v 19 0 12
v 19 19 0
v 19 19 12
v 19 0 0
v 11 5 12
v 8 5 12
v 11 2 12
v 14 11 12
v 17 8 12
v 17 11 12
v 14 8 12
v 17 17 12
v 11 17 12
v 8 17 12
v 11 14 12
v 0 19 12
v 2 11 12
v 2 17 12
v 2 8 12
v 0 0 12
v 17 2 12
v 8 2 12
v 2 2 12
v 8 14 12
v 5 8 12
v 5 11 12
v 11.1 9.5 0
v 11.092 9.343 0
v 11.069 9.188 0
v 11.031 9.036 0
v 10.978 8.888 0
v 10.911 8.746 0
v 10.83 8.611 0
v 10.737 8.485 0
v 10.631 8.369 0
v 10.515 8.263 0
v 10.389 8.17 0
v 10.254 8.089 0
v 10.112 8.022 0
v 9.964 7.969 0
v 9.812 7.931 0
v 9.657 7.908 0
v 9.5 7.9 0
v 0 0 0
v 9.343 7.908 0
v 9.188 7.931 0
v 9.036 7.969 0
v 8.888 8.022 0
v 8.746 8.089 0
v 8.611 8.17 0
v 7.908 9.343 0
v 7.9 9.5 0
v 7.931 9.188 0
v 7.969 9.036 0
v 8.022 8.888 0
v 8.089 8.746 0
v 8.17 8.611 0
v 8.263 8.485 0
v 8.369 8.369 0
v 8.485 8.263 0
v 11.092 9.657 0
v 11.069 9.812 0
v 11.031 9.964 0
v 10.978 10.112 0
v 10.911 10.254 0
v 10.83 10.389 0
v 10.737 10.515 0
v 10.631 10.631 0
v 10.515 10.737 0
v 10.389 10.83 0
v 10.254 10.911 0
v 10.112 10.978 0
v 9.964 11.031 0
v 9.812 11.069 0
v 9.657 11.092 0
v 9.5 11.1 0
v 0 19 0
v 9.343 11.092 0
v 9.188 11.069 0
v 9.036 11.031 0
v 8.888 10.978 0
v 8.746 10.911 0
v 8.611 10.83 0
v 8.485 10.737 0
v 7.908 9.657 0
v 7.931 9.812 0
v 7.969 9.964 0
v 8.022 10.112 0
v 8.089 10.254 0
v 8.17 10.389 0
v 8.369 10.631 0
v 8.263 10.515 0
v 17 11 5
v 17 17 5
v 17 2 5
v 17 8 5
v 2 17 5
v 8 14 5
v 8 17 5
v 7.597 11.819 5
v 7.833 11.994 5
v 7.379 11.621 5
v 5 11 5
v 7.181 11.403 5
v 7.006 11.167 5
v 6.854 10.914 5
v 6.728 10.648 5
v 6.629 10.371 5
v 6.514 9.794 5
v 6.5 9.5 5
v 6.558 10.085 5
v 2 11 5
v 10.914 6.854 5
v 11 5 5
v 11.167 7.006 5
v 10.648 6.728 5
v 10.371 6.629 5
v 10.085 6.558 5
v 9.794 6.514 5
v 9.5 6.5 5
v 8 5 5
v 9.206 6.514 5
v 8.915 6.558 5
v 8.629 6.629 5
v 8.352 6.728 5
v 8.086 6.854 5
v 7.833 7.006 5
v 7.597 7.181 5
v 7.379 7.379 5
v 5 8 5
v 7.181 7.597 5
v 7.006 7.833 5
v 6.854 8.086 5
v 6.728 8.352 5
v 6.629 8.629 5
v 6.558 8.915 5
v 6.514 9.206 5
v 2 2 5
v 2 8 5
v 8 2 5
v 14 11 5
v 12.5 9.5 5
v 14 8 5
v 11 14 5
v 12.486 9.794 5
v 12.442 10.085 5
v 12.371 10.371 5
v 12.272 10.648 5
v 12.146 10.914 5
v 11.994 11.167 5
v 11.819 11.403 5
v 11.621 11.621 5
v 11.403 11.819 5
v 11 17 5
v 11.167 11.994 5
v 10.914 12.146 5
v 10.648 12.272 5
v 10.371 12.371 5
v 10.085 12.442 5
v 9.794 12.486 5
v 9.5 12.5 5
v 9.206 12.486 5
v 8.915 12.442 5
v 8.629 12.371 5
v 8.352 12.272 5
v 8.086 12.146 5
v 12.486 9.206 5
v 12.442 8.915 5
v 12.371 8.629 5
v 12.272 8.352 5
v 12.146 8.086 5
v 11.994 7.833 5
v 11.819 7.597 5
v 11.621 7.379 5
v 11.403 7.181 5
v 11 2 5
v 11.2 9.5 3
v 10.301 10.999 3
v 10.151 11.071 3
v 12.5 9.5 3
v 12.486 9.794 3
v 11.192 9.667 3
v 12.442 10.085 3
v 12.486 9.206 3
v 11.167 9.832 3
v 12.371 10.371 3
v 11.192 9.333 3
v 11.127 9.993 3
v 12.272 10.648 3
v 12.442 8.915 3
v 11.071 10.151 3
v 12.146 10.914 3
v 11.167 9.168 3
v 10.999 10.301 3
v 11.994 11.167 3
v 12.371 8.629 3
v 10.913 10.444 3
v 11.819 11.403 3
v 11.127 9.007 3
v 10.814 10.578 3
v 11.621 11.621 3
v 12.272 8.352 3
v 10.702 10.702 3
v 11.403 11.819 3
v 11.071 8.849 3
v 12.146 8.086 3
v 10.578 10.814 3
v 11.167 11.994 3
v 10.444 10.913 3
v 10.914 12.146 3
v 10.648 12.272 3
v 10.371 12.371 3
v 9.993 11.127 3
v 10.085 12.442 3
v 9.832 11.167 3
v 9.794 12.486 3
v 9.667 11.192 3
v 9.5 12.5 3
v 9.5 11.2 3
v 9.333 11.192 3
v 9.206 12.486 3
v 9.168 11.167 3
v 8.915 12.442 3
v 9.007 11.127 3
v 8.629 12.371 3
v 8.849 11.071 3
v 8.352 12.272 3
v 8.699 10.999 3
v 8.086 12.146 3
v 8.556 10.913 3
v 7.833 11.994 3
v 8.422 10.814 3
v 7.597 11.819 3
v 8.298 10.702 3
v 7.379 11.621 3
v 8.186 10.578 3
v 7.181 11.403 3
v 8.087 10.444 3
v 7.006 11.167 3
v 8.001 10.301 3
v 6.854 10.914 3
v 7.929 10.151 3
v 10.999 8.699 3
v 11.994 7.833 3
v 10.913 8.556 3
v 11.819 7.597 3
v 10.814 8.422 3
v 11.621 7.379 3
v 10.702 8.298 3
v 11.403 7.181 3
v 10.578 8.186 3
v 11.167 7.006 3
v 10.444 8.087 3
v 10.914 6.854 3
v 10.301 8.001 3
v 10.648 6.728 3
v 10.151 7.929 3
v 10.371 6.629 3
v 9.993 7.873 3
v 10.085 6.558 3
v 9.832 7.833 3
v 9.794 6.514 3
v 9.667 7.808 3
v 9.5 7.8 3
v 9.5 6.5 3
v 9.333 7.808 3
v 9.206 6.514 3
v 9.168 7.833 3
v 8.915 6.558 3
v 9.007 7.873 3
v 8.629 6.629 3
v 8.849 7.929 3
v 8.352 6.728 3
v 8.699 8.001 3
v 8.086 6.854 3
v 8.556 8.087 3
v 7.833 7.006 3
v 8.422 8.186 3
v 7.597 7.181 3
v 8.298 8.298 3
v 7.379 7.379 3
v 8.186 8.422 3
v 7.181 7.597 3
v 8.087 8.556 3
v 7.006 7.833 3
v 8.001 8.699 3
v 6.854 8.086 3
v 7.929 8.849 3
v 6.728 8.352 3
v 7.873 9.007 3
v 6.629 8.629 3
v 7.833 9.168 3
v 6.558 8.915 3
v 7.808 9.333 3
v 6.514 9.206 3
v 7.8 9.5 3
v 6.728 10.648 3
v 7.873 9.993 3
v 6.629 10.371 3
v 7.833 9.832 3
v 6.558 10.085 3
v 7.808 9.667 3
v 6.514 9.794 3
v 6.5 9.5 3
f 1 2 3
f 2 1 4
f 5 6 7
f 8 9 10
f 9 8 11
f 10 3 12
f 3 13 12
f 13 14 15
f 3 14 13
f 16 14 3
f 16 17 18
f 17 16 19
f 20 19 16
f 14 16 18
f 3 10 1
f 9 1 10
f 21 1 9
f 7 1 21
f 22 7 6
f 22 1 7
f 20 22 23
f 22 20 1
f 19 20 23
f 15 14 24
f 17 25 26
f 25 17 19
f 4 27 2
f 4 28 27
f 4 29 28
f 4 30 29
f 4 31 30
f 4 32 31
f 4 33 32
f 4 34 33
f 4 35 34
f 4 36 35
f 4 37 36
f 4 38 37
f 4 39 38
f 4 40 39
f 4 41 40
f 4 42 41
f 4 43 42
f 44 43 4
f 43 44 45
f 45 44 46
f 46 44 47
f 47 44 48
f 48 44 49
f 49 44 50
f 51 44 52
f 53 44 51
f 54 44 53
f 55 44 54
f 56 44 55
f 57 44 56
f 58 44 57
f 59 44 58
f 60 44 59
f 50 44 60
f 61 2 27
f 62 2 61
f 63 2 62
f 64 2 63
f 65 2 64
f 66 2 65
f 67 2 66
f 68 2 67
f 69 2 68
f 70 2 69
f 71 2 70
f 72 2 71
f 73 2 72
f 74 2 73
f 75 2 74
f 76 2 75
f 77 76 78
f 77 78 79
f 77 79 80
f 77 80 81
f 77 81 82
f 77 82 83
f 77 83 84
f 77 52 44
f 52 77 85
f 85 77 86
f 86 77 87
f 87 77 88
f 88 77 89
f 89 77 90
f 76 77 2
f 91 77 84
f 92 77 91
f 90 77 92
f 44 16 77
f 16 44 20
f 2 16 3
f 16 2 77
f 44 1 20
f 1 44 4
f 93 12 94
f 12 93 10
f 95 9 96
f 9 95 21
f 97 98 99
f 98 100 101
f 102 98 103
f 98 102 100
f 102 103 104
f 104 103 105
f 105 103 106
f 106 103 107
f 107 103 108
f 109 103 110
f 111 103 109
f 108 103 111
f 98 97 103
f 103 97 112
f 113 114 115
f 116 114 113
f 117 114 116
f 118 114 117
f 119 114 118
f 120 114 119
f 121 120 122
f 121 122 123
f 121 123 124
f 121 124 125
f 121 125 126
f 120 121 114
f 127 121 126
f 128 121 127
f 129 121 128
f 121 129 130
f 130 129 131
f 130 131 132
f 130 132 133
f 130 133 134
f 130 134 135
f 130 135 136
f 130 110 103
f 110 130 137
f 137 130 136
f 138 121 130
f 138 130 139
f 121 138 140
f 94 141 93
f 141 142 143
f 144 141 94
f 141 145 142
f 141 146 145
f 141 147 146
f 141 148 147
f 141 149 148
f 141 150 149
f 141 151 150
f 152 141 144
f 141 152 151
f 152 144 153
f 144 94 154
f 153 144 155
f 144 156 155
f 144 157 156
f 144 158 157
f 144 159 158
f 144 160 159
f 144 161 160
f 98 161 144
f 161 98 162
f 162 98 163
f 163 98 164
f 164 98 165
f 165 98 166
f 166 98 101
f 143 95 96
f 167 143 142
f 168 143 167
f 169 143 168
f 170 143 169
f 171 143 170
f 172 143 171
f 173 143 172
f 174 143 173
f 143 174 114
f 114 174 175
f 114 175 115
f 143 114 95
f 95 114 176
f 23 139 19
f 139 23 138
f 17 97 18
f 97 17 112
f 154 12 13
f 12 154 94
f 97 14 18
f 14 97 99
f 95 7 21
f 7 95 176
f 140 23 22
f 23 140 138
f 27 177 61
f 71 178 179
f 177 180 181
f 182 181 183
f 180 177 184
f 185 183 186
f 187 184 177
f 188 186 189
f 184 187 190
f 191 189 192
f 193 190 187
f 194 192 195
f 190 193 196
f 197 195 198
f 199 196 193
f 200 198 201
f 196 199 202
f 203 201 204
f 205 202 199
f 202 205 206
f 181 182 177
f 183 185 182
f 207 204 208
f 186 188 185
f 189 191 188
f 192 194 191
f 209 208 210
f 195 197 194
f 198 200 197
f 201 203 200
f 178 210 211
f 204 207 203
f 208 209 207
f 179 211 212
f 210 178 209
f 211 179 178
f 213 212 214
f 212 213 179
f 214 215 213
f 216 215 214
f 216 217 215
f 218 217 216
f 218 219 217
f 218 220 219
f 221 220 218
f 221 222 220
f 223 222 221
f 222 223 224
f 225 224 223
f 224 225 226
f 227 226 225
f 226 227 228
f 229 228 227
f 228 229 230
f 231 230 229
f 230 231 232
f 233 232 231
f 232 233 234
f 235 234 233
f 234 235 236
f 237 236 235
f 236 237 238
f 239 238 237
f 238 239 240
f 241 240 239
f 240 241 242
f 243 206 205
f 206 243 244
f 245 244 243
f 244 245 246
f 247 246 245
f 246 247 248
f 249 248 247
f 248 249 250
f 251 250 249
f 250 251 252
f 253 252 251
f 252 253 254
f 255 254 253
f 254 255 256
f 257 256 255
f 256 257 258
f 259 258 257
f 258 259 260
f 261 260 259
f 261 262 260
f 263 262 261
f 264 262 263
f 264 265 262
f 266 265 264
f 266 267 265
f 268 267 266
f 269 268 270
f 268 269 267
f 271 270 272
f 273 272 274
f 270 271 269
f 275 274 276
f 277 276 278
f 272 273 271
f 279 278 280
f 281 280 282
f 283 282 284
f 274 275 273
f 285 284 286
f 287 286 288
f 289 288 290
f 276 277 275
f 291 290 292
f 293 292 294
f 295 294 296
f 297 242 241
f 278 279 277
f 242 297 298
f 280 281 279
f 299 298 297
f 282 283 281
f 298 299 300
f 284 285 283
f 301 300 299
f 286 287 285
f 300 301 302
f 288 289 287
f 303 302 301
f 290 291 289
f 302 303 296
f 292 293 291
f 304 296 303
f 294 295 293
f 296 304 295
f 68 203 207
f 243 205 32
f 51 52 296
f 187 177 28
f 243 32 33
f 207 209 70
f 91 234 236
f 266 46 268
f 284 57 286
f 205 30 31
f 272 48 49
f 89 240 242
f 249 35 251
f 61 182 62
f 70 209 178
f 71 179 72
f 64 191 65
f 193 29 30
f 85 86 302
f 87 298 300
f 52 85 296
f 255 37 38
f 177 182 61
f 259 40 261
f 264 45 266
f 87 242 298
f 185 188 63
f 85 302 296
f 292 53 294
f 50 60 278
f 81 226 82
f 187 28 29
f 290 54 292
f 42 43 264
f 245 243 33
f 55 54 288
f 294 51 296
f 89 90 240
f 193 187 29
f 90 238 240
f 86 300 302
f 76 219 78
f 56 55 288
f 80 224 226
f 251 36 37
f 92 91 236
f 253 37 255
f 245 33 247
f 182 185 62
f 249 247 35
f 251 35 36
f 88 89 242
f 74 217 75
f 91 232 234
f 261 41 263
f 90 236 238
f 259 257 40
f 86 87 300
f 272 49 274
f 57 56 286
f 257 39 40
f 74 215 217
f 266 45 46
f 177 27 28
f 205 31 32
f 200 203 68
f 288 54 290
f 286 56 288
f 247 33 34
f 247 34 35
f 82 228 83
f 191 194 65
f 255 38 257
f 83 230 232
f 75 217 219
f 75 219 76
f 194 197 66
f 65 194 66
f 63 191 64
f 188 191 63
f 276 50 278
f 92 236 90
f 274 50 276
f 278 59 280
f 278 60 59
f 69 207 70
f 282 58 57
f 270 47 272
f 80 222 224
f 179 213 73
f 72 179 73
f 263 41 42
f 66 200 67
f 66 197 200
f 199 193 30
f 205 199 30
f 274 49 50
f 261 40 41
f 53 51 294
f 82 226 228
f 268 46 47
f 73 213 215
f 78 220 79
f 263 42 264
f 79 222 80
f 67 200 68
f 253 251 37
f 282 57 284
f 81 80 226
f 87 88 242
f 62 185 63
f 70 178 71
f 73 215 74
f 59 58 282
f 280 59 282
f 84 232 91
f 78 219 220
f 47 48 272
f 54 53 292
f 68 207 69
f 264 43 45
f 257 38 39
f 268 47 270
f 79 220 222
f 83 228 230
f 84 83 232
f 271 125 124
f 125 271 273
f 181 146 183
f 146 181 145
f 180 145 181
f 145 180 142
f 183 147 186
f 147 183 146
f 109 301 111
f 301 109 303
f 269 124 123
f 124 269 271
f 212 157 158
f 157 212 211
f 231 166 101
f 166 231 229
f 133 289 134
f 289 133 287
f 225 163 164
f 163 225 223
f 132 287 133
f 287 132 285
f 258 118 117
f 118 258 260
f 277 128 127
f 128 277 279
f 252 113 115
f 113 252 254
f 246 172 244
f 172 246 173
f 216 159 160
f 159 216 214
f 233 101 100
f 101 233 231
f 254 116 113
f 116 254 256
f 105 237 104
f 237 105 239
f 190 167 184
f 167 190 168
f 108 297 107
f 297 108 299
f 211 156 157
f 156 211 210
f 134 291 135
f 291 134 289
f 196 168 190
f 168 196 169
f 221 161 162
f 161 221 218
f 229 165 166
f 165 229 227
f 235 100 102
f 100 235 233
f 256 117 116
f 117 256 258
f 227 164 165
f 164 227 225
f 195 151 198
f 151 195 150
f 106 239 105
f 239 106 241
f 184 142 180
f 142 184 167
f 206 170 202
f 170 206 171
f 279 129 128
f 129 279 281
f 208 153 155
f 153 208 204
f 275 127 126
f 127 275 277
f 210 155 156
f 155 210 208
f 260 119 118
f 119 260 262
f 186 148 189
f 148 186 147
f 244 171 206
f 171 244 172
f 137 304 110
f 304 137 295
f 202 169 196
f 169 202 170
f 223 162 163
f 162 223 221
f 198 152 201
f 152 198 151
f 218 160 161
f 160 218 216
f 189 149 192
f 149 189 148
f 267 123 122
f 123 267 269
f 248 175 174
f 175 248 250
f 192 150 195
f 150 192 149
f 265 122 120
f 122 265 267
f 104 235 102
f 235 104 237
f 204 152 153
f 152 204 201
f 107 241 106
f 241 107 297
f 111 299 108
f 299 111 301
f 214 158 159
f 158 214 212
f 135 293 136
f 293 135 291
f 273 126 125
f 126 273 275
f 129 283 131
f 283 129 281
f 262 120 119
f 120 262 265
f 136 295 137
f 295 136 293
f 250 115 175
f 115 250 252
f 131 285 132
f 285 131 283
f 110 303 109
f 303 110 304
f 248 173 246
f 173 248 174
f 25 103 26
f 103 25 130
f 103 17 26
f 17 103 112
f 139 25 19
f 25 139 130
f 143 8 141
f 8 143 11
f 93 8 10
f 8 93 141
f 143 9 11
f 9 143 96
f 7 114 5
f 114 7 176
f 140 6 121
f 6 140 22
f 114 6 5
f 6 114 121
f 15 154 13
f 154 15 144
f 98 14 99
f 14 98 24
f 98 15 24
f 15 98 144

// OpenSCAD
$fn = 64;


size = 30;

h = 20;

r = 5;

holeD = 6.8;
holeR = holeD / 2.0 ;


/*
module smoothSquare(size,r,h){
    
    difference(){
        translate([0,0,0]) cube([size,size,h]);
    
        translate([0,0,0]) cube([r,r,h]);
        translate([size - r,0,0]) cube([r,r,h]);
        translate([0,size - r,0]) cube([r,r,h]);
        translate([size - r,size - r,0]) cube([r,r,h]);
        
    }
    
    translate([r,r,0]) cylinder(h,r,r);
    translate([size - r,r,0]) cylinder(h,r,r);
    translate([r, size - r,0]) cylinder(h,r,r);
    translate([size - r ,size - r ,0]) cylinder(h,r,r);
   
      
}




module cutOut(x,y){
    
 difference(){
    translate([x  , y + 2,0]) cube([5,6,h]);

          
   translate([x + 2 ,y + 8 ,0]) rotate([0,0,-35]){
         cube([6,4,h]);  
        }
        
    translate([x + 4,y - 2 ,0]) rotate([0,0,35]){
            cube([6,4,h]);  
          }      
        
        
    }

    
}

module crossSection(){
    
    difference(){

    smoothSquare(size,r,h);
    

    
    cutOut(0,10);
    
    rotate([0,0,-90]){
        cutOut(-30,10);
    }
    
    rotate([0,0,180]){
        cutOut(-30,-20);
    }
   
    
    rotate([0,0,90]){
        cutOut(0,-20);
    }
}
    
}
*/
/* START OF DESIGN */
/*
difference(){
    
    translate([-4,-4,-4]) cube( [size + 8  , size + 8 , h + 4 ] );

    crossSection();
    
    translate( [ size / 2 ,size / 2 , - 4 ] ) #cylinder( 4 , 3 , 3 ); 
    
    translate( [ size / 2 ,size / 2 , - 1 ] ) cylinder( 4 , 5.75 , 5.75 ); 
    
}*/

width = 15.0;
wall = ( 19 -  width ) * 0.5;


difference(){

    translate([0,0,0]) cube ([19,19,12]);
    
    translate([wall,wall,5]) cube ([width,width,9]);
    
     translate( [ 9.5 , 9.5 ,0  ] ) #cylinder( 3 , 1.6 , 1.7 ); 
     translate( [ 9.5 , 9.5 ,3  ] ) #cylinder( 2 , 3.0 , 3.0 ); 
    
    
}


    translate([0,8,0]) cube ([5,3,12]);
    translate([14,8,0]) cube ([5,3,12]);
    translate([8,0,0]) cube ([3,5,12]);
    translate([8,14,0]) cube ([3,5,12]);
